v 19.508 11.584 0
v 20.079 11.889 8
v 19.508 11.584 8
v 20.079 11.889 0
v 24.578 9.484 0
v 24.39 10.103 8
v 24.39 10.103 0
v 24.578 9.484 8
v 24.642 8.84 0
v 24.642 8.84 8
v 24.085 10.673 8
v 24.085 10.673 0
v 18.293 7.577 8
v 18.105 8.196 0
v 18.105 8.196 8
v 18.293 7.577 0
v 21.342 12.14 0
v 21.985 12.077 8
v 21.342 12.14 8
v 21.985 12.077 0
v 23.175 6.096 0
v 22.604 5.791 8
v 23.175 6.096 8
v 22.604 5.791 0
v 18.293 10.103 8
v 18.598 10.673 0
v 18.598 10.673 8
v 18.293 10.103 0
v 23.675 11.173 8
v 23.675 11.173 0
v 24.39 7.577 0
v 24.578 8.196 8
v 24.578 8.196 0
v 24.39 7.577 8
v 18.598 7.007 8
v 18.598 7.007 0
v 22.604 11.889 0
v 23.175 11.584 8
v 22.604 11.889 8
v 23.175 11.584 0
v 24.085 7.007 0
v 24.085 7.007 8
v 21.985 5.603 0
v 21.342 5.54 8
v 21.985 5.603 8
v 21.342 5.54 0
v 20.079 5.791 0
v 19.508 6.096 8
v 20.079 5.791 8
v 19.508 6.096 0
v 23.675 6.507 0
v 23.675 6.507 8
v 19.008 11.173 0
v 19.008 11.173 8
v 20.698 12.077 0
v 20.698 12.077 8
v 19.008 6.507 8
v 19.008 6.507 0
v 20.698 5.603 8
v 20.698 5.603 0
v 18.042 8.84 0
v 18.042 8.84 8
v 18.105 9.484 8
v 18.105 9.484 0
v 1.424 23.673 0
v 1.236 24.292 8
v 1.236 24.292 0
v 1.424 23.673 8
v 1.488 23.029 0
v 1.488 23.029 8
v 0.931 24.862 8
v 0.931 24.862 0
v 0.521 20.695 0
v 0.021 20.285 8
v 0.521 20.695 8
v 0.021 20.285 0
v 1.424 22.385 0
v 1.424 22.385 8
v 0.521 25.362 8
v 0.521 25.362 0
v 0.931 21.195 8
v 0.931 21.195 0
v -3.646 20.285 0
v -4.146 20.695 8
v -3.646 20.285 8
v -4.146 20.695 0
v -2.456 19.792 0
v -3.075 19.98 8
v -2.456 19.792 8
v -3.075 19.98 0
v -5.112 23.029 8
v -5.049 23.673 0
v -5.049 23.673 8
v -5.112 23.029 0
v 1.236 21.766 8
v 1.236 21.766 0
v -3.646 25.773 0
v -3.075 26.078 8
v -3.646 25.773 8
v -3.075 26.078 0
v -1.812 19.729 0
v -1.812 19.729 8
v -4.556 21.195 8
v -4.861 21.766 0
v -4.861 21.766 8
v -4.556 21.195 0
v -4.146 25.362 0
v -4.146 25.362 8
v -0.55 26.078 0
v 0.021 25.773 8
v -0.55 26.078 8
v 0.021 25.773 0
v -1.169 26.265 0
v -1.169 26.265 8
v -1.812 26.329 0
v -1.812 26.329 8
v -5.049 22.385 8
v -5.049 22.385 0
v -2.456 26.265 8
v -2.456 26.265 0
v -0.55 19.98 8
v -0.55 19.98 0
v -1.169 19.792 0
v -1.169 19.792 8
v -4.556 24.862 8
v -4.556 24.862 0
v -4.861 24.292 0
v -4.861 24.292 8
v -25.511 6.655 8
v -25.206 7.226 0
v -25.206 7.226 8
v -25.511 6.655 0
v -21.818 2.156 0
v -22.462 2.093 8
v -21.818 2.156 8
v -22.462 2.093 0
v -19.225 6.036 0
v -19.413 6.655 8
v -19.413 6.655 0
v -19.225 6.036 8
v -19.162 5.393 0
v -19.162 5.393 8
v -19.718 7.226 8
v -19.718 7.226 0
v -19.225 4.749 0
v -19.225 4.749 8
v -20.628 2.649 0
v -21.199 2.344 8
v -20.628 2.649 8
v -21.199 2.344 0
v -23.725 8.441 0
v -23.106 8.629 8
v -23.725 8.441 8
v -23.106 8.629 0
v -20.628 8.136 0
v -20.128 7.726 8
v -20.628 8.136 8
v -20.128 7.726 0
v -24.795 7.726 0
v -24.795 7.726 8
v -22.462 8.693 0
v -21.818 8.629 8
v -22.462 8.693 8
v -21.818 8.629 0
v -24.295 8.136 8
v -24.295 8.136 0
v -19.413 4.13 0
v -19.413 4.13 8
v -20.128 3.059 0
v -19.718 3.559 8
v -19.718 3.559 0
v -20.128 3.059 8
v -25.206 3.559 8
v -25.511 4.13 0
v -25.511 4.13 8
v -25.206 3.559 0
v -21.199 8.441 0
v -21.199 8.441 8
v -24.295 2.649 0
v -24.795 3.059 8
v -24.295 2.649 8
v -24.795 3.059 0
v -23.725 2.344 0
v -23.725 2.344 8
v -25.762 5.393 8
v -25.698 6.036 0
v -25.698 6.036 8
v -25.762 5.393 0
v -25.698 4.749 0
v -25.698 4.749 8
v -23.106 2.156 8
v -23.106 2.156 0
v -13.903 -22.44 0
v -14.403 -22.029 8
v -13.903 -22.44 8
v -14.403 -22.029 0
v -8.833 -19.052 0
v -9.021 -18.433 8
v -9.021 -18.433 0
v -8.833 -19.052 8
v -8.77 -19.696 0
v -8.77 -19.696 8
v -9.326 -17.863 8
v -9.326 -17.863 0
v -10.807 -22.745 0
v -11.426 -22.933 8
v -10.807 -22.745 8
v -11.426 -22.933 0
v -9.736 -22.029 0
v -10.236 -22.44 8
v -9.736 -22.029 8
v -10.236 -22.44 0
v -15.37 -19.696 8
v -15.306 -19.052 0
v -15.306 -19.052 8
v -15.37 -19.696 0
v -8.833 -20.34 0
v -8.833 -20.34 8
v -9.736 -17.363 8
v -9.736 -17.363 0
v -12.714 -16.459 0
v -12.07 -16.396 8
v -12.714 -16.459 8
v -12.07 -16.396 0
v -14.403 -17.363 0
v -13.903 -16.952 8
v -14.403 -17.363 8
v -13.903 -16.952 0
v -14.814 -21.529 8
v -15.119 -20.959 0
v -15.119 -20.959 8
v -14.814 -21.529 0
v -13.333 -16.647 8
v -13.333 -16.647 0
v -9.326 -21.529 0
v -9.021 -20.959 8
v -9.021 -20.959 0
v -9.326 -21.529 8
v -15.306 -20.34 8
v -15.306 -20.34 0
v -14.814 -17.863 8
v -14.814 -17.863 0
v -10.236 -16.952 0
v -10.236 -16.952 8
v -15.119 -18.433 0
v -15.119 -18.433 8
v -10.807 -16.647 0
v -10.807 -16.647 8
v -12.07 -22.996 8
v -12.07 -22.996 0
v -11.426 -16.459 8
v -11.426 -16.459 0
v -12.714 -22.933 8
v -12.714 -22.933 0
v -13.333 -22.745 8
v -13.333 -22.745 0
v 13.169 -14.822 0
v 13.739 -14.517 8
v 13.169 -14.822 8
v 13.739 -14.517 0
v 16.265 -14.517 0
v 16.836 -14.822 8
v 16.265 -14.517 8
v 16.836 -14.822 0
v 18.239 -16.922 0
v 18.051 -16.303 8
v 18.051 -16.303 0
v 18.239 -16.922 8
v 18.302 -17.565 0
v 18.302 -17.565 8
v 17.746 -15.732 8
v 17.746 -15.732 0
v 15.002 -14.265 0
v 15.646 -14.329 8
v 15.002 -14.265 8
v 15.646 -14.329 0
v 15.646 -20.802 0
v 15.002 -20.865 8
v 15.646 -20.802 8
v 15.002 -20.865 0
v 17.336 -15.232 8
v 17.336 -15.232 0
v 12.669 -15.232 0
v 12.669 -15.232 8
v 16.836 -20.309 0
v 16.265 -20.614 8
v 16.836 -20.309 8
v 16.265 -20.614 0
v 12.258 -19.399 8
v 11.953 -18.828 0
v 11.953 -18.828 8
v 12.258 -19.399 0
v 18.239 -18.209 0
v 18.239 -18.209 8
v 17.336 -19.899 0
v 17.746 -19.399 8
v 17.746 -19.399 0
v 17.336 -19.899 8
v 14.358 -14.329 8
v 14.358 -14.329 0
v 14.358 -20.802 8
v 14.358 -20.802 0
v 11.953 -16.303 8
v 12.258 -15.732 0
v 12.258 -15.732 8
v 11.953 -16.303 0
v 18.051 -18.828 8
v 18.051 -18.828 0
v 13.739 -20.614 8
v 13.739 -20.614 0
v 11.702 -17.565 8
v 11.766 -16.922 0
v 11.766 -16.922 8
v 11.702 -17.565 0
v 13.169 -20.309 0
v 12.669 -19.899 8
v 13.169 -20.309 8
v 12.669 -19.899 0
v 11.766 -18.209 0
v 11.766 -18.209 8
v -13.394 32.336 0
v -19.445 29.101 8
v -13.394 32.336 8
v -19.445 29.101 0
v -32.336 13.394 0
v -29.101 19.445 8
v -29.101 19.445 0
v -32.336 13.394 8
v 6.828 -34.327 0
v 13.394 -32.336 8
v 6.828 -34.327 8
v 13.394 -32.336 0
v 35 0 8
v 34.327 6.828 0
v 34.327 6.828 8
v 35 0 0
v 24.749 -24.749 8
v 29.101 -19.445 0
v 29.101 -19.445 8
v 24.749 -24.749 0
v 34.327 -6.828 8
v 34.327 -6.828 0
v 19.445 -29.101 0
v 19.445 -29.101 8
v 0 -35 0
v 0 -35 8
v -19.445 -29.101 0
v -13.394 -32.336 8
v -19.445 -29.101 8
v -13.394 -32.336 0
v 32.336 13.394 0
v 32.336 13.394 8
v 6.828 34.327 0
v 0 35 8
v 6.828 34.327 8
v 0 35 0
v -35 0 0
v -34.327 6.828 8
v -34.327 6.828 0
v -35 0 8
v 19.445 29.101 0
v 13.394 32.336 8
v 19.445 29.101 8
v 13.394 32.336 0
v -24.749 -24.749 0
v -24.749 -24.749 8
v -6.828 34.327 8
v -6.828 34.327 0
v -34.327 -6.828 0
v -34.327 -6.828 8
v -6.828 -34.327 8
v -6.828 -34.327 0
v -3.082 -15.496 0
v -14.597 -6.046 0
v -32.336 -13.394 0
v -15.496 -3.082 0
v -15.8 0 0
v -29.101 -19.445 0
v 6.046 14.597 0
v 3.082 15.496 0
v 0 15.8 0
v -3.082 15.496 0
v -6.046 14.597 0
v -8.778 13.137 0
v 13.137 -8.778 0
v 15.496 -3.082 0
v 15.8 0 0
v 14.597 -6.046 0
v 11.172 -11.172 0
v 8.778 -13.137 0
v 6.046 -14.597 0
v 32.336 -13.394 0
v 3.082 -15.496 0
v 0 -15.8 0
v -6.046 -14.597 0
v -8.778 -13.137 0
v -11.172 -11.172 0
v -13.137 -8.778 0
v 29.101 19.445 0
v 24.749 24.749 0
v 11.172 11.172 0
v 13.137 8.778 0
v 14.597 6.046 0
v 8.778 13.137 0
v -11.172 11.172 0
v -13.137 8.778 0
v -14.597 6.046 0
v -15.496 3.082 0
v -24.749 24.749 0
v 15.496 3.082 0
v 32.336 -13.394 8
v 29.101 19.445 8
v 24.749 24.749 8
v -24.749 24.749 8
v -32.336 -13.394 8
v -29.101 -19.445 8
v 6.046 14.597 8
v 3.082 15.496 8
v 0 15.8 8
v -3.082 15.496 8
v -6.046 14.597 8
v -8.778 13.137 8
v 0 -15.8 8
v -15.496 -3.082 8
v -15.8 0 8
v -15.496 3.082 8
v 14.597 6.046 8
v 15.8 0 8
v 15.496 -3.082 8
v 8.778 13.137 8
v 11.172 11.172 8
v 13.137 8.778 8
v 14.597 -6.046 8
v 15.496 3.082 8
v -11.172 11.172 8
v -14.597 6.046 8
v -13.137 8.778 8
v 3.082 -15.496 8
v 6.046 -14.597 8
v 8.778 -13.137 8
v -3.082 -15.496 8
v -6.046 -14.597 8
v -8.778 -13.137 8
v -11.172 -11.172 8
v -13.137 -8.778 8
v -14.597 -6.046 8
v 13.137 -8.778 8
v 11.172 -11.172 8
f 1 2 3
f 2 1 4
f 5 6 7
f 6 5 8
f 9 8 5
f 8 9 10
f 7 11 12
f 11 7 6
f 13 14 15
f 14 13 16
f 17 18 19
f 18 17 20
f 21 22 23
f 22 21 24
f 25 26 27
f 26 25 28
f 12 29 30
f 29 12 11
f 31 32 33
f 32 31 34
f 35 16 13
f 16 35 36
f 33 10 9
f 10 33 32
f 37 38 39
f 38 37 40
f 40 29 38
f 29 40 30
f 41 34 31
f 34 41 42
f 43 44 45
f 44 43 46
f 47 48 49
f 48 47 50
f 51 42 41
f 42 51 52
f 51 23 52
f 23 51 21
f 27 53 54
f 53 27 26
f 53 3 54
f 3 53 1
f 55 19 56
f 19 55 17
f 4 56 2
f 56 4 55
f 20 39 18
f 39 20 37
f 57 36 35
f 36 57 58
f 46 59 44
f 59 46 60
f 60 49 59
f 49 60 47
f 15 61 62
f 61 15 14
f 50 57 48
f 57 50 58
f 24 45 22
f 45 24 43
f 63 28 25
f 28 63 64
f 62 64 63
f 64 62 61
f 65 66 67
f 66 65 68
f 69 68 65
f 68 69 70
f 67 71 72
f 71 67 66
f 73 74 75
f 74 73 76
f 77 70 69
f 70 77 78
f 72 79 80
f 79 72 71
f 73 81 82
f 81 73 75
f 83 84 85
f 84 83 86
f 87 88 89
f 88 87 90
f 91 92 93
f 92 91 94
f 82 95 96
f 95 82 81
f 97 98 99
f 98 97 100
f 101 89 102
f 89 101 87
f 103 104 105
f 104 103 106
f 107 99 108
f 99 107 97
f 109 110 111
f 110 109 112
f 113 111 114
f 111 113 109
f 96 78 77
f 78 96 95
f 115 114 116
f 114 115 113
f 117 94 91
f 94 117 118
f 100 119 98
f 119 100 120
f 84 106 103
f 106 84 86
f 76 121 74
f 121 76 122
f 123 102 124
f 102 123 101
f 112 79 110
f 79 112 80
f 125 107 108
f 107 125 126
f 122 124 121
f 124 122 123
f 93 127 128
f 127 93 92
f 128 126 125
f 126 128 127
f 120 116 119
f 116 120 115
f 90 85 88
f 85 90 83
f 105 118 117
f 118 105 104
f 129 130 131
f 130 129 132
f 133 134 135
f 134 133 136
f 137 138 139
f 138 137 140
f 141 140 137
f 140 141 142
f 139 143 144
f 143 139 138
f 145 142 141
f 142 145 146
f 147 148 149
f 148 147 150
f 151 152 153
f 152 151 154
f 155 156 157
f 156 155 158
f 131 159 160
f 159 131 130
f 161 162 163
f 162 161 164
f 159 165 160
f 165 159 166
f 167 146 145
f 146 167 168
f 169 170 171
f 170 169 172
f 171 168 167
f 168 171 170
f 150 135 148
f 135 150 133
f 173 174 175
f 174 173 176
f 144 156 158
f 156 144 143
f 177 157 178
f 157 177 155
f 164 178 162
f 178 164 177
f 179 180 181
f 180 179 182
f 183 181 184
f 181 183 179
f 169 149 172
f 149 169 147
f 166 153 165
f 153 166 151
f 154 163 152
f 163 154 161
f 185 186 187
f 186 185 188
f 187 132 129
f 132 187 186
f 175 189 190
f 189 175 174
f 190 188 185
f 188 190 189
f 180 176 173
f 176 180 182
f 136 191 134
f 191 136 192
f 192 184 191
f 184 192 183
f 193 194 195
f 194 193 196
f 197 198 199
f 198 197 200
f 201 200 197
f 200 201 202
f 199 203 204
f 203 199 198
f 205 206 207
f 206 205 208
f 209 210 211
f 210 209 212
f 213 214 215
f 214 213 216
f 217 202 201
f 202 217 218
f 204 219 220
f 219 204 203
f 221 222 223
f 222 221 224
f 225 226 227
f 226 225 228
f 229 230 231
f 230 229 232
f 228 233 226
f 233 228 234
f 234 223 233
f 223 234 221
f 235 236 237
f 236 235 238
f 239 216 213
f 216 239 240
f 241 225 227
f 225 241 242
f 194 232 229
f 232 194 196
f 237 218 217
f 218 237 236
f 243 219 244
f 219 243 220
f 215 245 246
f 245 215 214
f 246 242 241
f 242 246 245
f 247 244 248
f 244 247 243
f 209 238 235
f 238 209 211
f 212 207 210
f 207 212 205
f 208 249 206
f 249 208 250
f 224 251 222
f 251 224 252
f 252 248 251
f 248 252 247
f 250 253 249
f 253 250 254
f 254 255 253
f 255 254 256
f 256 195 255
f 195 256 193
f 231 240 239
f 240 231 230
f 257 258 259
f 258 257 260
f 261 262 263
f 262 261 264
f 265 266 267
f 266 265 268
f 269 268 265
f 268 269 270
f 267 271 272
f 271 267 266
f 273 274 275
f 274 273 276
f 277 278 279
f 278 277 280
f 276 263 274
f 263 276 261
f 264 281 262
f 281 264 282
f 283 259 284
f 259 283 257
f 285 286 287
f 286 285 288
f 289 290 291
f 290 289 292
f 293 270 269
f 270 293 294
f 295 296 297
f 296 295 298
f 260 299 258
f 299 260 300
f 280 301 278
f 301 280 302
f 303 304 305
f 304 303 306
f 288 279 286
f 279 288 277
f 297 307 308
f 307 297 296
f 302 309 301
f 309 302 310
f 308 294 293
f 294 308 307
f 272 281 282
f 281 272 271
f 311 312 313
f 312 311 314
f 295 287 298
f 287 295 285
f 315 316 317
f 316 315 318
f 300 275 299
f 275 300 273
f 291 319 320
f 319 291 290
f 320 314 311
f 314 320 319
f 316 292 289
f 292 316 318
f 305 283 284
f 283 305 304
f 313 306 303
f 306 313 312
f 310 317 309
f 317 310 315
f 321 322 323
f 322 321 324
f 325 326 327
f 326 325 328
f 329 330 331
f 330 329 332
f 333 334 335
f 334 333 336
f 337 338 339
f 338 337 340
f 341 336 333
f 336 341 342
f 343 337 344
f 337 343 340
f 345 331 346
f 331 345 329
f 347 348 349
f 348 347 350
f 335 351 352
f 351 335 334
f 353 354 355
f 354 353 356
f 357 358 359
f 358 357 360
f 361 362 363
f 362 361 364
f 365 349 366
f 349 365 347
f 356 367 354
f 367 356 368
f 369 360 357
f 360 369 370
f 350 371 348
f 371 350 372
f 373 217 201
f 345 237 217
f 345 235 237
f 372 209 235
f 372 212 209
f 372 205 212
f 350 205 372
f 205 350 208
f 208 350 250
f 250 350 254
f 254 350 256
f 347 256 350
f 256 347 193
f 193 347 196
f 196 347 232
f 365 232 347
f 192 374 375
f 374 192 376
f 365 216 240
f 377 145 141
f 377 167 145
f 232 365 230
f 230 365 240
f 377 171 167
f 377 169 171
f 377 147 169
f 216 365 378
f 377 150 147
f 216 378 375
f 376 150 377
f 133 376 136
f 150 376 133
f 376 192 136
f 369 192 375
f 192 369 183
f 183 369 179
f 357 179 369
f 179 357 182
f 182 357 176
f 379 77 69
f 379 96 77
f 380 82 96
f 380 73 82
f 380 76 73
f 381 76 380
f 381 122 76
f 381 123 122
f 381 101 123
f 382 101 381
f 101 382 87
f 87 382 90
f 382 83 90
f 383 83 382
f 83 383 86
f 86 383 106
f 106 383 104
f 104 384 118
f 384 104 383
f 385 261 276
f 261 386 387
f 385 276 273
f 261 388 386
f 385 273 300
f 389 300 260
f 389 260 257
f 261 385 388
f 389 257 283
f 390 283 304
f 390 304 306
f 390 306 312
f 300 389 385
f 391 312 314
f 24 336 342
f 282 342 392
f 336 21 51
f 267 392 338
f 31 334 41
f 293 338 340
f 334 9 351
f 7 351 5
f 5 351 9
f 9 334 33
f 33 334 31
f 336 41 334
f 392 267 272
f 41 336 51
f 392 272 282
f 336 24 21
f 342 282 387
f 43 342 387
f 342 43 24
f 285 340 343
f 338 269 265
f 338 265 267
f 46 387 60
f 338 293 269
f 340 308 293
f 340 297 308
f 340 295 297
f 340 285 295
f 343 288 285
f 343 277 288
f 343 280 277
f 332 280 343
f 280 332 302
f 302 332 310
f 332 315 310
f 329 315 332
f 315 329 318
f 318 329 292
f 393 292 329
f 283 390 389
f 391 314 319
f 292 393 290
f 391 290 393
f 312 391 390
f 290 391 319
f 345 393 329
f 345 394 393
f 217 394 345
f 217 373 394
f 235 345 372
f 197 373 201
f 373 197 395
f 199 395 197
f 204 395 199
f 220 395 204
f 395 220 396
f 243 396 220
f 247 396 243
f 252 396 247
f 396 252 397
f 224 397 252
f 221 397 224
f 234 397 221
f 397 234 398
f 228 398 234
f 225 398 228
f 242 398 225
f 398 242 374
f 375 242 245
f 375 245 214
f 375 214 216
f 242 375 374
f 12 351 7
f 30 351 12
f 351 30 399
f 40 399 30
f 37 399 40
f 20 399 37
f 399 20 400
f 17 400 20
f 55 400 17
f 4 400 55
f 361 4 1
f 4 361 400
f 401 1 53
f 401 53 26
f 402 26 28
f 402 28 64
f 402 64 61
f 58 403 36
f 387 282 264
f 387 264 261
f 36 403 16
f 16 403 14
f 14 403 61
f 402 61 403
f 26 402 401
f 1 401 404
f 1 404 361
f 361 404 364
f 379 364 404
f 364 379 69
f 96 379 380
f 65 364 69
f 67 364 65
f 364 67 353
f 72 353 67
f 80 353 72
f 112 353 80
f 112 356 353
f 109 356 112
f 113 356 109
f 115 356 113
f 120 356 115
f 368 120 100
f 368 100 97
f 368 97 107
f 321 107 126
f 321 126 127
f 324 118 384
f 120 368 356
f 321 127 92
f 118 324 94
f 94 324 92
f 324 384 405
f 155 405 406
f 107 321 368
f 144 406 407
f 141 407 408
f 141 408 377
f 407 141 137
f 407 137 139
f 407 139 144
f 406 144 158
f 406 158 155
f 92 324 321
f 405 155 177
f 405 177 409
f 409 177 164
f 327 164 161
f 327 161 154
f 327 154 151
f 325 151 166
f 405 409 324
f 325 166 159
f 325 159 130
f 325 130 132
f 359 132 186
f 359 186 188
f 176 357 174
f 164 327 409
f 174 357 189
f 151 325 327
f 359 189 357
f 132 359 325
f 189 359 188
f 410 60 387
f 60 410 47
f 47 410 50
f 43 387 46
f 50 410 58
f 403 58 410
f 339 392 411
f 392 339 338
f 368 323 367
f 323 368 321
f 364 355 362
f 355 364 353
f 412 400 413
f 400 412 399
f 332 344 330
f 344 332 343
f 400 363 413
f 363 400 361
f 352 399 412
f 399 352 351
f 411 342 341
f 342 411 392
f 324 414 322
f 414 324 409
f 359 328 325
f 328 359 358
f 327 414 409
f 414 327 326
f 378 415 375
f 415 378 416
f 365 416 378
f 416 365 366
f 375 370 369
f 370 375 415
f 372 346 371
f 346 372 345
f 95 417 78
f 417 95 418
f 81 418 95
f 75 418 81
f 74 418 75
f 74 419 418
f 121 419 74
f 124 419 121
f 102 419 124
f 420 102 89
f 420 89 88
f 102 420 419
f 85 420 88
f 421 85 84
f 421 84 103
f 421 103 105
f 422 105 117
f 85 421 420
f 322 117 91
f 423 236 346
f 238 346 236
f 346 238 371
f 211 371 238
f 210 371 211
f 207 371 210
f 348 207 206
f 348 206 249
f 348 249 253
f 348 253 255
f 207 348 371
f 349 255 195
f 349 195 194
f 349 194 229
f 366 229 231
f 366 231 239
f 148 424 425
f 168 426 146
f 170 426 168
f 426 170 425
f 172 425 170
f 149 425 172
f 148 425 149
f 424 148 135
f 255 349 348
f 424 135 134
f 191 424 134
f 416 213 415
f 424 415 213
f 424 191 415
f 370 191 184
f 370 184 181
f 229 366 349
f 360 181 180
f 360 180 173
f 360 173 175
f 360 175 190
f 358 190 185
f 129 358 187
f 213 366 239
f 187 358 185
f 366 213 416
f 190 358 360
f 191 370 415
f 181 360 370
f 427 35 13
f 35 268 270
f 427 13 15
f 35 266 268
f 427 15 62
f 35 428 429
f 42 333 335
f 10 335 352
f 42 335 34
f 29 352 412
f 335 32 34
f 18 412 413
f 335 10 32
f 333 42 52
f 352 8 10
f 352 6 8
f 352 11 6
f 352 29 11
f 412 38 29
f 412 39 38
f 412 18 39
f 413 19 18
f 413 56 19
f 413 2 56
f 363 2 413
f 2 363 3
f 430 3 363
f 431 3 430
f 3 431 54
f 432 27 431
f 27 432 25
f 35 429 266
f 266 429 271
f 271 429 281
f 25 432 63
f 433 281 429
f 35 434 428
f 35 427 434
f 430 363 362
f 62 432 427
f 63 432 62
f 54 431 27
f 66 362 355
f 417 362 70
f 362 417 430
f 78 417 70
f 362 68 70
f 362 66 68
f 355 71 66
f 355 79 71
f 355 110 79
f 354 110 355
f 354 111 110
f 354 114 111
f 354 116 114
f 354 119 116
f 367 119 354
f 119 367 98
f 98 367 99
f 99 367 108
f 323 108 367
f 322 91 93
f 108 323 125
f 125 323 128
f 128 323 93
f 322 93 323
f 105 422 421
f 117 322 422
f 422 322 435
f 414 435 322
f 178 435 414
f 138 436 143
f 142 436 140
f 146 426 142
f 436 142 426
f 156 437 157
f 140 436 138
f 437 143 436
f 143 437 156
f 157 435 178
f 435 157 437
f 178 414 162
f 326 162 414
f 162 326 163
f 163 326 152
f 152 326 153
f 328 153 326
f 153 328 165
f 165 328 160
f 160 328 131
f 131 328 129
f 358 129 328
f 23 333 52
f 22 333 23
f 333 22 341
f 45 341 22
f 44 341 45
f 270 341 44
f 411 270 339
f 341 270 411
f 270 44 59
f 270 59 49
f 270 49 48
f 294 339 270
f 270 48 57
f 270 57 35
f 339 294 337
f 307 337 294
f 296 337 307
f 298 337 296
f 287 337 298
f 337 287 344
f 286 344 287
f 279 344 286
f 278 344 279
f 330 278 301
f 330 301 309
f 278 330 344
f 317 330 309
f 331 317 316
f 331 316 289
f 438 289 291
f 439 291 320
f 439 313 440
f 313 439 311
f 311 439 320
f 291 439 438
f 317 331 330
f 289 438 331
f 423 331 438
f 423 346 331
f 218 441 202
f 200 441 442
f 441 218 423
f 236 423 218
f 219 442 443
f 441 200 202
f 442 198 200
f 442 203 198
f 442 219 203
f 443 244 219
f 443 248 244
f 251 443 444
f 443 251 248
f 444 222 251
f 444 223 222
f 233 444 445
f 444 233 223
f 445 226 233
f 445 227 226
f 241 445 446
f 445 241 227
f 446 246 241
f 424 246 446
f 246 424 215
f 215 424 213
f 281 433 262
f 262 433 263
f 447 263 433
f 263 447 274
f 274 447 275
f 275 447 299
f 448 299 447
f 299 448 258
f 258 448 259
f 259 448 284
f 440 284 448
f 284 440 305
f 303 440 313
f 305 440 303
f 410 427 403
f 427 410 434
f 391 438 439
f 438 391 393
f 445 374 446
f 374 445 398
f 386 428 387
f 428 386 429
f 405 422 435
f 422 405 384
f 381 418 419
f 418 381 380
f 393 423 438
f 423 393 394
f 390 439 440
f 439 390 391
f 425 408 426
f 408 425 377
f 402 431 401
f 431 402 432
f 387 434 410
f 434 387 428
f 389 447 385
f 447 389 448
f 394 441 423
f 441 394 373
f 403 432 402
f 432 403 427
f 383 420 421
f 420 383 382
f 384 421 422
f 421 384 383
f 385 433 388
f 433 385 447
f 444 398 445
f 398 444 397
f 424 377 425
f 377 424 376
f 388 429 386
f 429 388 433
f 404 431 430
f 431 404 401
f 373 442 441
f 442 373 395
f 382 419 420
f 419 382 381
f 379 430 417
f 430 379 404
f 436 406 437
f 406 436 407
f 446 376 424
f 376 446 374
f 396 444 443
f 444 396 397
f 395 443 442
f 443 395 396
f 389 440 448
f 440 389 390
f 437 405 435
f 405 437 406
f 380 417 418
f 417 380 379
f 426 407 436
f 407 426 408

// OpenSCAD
$fn = 32;

// ----------------------------------------------------------------------
// Flange Ø70 x 8
// 5 holes on a Ø46.2 bolt circle, bolted joints
// ----------------------------------------------------------------------

// --- parameters (mm) ---
flange_d = 70;     // outside diameter of the flange
thickness = 8;     // flange thickness
holes = 5;         // number of bolt holes
pcd = 46.2;        // bolt circle diameter
start_deg = 22.5;  // angle of the first hole, from +X
hole_d = 6.6;      // bolt hole diameter
bore_d = 31.6;     // central through bore
hub_d = 41.6;      // hub outside diameter
hub_h = 0;         // hub height above the flange face (0 = no hub)

// --- derived feature positions (mm) ---
height = thickness + hub_h;  // = 8   overall height of the part
pcd_r = pcd / 2;             // = 23.1   bolt circle radius
hole_step = 360 / holes;     // = 72   angular pitch
feature_centers = [
  [pcd_r * cos(start_deg + 0 * hole_step), pcd_r * sin(start_deg + 0 * hole_step)],
  [pcd_r * cos(start_deg + 1 * hole_step), pcd_r * sin(start_deg + 1 * hole_step)],
  [pcd_r * cos(start_deg + 2 * hole_step), pcd_r * sin(start_deg + 2 * hole_step)],
  [pcd_r * cos(start_deg + 3 * hole_step), pcd_r * sin(start_deg + 3 * hole_step)],
  [pcd_r * cos(start_deg + 4 * hole_step), pcd_r * sin(start_deg + 4 * hole_step)]
];   // bolt hole centres on the pitch circle

// flange disc, every hole and the bore cut straight through
difference() {
  union() {
    cylinder(d = flange_d, h = thickness);
  }
  translate([0, 0, -1]) cylinder(d = bore_d, h = height + 2);  // bore, through
  for (centre = feature_centers)
    translate([centre[0], centre[1], -1]) cylinder(d = hole_d, h = thickness + 2);
}
